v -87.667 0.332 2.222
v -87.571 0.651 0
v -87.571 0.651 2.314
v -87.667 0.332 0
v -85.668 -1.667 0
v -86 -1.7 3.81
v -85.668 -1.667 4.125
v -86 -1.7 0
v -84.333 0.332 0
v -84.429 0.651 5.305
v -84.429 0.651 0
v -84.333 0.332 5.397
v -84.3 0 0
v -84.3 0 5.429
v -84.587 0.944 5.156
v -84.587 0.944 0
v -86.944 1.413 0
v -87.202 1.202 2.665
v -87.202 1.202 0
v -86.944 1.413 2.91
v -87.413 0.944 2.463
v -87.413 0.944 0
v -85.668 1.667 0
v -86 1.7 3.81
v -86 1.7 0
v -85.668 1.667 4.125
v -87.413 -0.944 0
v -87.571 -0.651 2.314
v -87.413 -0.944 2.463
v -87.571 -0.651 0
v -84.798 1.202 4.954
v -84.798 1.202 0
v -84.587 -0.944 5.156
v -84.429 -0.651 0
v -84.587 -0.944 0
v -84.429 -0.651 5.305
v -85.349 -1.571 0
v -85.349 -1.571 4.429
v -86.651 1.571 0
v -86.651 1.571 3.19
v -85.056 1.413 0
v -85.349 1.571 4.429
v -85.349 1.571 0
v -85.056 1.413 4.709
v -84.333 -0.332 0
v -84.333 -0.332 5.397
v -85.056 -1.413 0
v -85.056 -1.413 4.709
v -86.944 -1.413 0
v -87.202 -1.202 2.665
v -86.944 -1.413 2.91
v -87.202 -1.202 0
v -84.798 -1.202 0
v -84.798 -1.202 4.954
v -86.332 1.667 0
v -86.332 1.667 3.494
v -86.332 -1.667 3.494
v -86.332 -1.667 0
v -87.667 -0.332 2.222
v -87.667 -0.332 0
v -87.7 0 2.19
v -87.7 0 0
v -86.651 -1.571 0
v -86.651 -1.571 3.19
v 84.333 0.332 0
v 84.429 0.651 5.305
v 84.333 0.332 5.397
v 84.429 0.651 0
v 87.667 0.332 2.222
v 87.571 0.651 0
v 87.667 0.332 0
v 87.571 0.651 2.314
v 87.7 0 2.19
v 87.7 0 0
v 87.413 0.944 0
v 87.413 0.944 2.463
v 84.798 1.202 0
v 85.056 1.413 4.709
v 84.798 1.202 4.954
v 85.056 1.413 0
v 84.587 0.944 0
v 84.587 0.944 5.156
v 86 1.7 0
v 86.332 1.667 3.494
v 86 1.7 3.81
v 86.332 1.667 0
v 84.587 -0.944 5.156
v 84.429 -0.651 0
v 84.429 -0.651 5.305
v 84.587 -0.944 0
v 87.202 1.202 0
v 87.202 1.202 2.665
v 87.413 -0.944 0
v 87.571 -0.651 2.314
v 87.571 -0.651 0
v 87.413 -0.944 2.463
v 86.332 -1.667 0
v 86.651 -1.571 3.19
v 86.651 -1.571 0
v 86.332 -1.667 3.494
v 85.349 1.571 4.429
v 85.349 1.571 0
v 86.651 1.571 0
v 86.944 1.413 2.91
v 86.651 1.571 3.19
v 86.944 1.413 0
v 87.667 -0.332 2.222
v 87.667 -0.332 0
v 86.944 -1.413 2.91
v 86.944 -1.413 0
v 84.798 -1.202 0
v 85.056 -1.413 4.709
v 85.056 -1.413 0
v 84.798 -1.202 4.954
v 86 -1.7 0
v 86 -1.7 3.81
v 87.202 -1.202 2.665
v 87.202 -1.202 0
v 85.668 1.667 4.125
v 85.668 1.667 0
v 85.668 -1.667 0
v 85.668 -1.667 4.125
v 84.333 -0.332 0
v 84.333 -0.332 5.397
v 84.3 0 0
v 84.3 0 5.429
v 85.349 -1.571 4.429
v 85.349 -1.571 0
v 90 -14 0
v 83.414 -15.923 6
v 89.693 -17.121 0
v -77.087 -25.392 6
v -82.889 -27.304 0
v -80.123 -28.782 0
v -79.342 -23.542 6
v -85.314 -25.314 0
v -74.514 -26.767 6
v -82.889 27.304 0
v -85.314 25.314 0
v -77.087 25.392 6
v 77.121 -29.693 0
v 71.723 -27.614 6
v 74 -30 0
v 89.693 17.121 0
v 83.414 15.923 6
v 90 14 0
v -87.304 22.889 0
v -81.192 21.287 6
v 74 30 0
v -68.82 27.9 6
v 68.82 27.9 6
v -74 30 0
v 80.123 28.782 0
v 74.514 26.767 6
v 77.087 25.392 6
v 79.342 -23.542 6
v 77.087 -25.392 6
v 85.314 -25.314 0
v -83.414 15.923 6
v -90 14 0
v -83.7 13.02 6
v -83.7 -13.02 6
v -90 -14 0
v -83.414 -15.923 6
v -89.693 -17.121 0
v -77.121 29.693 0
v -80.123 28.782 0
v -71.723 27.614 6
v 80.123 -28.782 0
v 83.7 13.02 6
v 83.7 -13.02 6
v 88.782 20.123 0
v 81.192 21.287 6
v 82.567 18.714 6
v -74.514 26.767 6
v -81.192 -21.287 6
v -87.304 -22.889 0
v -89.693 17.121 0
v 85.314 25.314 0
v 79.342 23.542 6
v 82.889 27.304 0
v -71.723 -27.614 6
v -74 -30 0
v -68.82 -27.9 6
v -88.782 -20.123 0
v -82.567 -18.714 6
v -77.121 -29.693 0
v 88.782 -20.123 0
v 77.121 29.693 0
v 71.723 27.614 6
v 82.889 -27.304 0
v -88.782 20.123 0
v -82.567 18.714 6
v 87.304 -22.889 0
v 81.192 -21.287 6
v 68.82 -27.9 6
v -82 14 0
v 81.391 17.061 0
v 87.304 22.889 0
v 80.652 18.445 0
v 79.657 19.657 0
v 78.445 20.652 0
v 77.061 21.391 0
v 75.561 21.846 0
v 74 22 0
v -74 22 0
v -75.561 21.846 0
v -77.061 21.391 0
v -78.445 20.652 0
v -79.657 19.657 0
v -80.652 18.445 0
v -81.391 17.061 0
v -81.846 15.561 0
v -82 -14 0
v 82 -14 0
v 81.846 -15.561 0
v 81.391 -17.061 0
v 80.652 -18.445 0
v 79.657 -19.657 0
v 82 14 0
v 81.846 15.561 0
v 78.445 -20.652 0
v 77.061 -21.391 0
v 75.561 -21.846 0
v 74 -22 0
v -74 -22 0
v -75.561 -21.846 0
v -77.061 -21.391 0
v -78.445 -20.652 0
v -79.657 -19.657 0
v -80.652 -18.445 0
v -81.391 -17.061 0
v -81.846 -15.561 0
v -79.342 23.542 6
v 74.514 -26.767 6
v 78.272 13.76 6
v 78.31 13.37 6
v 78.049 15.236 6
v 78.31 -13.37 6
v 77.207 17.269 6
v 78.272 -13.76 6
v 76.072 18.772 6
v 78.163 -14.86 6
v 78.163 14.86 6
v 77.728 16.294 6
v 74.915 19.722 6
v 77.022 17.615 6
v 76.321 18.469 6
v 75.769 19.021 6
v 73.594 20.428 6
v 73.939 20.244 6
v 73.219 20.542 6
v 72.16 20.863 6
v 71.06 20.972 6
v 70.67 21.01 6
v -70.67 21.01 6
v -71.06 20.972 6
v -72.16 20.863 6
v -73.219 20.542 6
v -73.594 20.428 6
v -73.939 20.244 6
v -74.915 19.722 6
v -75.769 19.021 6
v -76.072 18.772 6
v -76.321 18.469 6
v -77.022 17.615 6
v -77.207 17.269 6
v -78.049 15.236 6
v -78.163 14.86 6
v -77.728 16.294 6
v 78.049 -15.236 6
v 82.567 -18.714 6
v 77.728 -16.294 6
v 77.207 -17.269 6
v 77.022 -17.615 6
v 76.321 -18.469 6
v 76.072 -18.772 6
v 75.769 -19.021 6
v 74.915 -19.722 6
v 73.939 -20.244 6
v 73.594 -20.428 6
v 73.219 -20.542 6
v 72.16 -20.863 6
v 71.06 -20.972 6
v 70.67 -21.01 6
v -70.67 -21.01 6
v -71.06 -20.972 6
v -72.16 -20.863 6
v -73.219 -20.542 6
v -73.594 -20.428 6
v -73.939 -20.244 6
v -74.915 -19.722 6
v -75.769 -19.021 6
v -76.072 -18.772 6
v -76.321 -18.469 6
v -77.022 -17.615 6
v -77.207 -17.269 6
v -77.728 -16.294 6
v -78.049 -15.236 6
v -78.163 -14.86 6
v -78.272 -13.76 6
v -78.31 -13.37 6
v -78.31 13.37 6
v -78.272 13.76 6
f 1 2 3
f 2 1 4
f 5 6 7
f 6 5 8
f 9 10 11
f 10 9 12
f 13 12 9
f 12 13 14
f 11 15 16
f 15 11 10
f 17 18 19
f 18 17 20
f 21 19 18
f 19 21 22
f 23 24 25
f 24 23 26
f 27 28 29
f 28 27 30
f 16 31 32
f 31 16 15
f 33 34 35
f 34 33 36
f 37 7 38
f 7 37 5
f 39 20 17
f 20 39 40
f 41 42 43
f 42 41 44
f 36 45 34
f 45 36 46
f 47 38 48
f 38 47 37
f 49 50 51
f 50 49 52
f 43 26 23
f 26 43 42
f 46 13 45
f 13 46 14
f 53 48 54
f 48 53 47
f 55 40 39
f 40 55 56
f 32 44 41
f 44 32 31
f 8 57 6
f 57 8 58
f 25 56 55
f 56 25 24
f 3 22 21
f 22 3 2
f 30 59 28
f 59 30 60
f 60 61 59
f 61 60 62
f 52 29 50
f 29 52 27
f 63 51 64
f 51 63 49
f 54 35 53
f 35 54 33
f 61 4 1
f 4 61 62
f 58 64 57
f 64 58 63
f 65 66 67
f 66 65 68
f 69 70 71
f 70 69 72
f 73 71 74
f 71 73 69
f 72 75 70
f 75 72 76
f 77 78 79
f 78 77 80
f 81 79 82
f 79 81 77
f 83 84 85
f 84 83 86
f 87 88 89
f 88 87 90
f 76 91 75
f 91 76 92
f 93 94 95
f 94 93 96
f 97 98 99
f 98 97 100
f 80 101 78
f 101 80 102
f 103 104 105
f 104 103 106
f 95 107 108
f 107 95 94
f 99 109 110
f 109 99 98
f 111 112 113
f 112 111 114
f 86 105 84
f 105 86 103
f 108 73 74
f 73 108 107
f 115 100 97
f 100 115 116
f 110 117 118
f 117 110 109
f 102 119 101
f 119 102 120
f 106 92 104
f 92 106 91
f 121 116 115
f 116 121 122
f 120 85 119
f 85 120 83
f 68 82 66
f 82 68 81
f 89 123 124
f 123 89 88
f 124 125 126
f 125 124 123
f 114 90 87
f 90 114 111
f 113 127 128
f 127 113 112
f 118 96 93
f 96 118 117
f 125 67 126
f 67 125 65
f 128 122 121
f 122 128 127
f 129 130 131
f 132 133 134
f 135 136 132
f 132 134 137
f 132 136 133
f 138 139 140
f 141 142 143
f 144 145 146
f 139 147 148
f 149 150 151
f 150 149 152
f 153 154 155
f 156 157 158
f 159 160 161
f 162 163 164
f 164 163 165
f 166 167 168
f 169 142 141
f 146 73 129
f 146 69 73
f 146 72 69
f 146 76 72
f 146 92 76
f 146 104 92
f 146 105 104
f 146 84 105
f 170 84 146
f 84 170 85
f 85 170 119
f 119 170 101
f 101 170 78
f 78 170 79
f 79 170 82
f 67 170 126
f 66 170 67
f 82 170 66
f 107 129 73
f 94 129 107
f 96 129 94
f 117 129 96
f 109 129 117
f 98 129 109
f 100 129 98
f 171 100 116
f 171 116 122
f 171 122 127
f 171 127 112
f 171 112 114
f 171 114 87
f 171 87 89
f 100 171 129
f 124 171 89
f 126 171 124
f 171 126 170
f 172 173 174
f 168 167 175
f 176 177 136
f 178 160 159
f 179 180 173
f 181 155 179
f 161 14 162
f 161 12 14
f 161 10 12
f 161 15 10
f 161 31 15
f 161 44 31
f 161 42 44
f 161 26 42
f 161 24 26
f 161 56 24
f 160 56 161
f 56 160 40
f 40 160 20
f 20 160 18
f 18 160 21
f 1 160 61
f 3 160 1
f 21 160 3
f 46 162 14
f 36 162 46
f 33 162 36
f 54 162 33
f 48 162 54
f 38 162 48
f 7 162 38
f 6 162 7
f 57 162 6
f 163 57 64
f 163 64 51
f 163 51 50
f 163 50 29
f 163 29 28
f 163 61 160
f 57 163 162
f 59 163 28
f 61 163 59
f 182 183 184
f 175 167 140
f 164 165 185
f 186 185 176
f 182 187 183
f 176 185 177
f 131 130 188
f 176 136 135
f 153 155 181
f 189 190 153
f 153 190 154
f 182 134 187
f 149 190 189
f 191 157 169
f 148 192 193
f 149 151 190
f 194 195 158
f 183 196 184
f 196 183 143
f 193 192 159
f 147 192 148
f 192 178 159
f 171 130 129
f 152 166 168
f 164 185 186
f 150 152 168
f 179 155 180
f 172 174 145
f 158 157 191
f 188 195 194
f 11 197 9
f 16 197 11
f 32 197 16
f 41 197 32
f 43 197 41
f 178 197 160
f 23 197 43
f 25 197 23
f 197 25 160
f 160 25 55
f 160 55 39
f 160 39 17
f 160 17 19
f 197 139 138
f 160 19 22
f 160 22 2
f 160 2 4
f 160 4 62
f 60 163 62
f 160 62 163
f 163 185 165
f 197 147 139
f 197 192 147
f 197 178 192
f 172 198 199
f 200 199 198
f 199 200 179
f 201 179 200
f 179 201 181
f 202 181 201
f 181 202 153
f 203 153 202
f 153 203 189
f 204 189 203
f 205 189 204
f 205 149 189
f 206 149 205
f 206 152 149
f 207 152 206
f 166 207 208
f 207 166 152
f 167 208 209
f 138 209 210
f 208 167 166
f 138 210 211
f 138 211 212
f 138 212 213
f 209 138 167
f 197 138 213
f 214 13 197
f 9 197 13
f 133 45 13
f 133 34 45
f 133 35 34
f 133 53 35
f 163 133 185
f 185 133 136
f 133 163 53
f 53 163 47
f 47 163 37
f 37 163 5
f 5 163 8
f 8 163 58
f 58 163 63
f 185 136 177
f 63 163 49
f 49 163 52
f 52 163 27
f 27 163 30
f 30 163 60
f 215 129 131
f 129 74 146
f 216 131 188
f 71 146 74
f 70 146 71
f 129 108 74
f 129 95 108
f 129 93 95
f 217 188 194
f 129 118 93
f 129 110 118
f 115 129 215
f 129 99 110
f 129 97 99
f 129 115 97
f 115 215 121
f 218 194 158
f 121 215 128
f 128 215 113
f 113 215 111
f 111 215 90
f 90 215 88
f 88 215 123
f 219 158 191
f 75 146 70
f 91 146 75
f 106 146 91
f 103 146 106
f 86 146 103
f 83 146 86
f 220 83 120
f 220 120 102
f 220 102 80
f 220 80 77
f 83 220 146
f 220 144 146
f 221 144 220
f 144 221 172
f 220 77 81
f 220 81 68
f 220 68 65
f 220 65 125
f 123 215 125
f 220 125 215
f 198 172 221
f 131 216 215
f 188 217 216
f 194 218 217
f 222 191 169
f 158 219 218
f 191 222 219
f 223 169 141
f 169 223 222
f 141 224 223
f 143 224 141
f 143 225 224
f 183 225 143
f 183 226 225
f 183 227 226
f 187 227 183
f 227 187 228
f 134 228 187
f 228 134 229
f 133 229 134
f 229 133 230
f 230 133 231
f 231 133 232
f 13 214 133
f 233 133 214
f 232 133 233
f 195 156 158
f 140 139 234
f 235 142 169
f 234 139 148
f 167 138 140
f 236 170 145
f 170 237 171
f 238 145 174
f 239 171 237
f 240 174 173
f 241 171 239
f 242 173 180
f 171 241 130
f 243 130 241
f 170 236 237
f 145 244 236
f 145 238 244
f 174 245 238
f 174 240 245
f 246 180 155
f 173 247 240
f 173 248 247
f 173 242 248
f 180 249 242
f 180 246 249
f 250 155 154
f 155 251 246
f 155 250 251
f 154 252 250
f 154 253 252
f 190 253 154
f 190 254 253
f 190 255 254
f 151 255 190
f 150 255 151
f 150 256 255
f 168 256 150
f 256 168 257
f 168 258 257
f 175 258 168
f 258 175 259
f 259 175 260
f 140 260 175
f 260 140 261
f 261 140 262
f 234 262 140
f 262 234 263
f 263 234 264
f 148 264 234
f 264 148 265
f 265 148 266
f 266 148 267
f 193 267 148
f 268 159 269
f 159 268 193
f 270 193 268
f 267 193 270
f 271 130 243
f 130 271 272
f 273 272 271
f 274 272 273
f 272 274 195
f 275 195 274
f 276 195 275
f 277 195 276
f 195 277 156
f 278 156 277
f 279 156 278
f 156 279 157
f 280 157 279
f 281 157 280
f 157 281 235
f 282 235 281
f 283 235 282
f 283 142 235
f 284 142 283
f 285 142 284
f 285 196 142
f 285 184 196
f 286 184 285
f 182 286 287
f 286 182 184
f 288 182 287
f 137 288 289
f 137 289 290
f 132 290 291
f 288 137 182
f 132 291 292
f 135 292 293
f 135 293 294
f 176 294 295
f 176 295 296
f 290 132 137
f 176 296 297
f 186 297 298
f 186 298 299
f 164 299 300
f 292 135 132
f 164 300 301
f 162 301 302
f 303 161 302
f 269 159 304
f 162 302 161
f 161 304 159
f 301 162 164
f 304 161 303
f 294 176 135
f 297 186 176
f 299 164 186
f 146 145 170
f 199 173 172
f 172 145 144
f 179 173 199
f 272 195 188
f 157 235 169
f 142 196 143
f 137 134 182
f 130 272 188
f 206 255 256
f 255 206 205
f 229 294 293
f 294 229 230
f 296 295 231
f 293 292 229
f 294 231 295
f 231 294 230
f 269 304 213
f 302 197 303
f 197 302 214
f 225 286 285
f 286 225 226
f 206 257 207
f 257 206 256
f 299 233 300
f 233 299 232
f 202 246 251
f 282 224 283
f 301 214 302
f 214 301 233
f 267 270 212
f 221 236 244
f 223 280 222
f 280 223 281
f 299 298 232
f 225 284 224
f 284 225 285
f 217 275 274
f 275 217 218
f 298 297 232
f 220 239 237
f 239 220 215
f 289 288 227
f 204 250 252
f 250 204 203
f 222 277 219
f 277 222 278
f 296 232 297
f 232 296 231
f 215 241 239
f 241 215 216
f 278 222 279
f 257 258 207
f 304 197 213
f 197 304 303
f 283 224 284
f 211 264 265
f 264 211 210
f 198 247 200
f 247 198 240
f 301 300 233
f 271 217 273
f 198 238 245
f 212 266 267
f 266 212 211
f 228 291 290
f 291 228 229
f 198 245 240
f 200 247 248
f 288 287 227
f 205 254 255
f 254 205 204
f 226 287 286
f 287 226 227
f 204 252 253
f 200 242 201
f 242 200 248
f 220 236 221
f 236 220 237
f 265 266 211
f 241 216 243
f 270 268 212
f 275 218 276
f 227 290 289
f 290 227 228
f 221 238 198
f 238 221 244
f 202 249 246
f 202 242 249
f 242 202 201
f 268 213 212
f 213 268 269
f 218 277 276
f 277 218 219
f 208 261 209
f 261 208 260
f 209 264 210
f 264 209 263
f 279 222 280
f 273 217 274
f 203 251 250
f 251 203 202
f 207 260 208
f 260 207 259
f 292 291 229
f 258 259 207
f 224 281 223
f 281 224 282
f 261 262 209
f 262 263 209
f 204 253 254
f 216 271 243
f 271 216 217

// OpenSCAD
$fn = 32;

// ----------------------------------------------------------------------
// Display bezel: 180 x 60 mm frame, opening 164x44 mm
// ----------------------------------------------------------------------

// --- parameters (mm) ---
length = 180;             // frame outside length, X
width = 60;               // frame outside width, Y
frame_w = 8;              // frame width
thickness = 6;            // frame thickness
corner_r = 16;            // outside corner radius
chamfer = 0.93;           // outer wall taper
funnel = 0.94;            // inner opening taper
opening_l = 164;          // opening length
opening_w = 44;           // opening width
inner_r = 8;              // opening corner radius
hole_d = 3.4;             // mounting screw clearance
holes_per_side = 1;       // holes per short side
hole_inset = 4;           // hole centre inset from the outside edge

/* rounded-rectangle outlines, generated with loops */
module rounded_ring(l_nom, w_nom, r) {
  hull() {
    for (sx = [-1, 1]) for (sy = [-1, 1])
      translate([sx * (l_nom / 2 - r), sy * (w_nom / 2 - r)]) circle(r = r);
  }
}

difference() {
  /* frame body, drafted so the outer edge is a variable-depth chamfer */
  linear_extrude(height = thickness, scale = chamfer)
    rounded_ring(length, width, corner_r);
  /* viewing opening, drafted the other way for a funnel edge */
  linear_extrude(height = thickness + 2, scale = funnel)
    translate([0, 0, -1]) rounded_ring(opening_l, opening_w, inner_r);
  /* mounting screws through the frame lands */
  for (sx = [-1, 1]) for (i = [1 : holes_per_side])
    translate([sx * (length / 2 - hole_inset),
               (i - (holes_per_side + 1) / 2) * width * 0.5, -1])
      cylinder(h = thickness + 2, d = hole_d);
}
